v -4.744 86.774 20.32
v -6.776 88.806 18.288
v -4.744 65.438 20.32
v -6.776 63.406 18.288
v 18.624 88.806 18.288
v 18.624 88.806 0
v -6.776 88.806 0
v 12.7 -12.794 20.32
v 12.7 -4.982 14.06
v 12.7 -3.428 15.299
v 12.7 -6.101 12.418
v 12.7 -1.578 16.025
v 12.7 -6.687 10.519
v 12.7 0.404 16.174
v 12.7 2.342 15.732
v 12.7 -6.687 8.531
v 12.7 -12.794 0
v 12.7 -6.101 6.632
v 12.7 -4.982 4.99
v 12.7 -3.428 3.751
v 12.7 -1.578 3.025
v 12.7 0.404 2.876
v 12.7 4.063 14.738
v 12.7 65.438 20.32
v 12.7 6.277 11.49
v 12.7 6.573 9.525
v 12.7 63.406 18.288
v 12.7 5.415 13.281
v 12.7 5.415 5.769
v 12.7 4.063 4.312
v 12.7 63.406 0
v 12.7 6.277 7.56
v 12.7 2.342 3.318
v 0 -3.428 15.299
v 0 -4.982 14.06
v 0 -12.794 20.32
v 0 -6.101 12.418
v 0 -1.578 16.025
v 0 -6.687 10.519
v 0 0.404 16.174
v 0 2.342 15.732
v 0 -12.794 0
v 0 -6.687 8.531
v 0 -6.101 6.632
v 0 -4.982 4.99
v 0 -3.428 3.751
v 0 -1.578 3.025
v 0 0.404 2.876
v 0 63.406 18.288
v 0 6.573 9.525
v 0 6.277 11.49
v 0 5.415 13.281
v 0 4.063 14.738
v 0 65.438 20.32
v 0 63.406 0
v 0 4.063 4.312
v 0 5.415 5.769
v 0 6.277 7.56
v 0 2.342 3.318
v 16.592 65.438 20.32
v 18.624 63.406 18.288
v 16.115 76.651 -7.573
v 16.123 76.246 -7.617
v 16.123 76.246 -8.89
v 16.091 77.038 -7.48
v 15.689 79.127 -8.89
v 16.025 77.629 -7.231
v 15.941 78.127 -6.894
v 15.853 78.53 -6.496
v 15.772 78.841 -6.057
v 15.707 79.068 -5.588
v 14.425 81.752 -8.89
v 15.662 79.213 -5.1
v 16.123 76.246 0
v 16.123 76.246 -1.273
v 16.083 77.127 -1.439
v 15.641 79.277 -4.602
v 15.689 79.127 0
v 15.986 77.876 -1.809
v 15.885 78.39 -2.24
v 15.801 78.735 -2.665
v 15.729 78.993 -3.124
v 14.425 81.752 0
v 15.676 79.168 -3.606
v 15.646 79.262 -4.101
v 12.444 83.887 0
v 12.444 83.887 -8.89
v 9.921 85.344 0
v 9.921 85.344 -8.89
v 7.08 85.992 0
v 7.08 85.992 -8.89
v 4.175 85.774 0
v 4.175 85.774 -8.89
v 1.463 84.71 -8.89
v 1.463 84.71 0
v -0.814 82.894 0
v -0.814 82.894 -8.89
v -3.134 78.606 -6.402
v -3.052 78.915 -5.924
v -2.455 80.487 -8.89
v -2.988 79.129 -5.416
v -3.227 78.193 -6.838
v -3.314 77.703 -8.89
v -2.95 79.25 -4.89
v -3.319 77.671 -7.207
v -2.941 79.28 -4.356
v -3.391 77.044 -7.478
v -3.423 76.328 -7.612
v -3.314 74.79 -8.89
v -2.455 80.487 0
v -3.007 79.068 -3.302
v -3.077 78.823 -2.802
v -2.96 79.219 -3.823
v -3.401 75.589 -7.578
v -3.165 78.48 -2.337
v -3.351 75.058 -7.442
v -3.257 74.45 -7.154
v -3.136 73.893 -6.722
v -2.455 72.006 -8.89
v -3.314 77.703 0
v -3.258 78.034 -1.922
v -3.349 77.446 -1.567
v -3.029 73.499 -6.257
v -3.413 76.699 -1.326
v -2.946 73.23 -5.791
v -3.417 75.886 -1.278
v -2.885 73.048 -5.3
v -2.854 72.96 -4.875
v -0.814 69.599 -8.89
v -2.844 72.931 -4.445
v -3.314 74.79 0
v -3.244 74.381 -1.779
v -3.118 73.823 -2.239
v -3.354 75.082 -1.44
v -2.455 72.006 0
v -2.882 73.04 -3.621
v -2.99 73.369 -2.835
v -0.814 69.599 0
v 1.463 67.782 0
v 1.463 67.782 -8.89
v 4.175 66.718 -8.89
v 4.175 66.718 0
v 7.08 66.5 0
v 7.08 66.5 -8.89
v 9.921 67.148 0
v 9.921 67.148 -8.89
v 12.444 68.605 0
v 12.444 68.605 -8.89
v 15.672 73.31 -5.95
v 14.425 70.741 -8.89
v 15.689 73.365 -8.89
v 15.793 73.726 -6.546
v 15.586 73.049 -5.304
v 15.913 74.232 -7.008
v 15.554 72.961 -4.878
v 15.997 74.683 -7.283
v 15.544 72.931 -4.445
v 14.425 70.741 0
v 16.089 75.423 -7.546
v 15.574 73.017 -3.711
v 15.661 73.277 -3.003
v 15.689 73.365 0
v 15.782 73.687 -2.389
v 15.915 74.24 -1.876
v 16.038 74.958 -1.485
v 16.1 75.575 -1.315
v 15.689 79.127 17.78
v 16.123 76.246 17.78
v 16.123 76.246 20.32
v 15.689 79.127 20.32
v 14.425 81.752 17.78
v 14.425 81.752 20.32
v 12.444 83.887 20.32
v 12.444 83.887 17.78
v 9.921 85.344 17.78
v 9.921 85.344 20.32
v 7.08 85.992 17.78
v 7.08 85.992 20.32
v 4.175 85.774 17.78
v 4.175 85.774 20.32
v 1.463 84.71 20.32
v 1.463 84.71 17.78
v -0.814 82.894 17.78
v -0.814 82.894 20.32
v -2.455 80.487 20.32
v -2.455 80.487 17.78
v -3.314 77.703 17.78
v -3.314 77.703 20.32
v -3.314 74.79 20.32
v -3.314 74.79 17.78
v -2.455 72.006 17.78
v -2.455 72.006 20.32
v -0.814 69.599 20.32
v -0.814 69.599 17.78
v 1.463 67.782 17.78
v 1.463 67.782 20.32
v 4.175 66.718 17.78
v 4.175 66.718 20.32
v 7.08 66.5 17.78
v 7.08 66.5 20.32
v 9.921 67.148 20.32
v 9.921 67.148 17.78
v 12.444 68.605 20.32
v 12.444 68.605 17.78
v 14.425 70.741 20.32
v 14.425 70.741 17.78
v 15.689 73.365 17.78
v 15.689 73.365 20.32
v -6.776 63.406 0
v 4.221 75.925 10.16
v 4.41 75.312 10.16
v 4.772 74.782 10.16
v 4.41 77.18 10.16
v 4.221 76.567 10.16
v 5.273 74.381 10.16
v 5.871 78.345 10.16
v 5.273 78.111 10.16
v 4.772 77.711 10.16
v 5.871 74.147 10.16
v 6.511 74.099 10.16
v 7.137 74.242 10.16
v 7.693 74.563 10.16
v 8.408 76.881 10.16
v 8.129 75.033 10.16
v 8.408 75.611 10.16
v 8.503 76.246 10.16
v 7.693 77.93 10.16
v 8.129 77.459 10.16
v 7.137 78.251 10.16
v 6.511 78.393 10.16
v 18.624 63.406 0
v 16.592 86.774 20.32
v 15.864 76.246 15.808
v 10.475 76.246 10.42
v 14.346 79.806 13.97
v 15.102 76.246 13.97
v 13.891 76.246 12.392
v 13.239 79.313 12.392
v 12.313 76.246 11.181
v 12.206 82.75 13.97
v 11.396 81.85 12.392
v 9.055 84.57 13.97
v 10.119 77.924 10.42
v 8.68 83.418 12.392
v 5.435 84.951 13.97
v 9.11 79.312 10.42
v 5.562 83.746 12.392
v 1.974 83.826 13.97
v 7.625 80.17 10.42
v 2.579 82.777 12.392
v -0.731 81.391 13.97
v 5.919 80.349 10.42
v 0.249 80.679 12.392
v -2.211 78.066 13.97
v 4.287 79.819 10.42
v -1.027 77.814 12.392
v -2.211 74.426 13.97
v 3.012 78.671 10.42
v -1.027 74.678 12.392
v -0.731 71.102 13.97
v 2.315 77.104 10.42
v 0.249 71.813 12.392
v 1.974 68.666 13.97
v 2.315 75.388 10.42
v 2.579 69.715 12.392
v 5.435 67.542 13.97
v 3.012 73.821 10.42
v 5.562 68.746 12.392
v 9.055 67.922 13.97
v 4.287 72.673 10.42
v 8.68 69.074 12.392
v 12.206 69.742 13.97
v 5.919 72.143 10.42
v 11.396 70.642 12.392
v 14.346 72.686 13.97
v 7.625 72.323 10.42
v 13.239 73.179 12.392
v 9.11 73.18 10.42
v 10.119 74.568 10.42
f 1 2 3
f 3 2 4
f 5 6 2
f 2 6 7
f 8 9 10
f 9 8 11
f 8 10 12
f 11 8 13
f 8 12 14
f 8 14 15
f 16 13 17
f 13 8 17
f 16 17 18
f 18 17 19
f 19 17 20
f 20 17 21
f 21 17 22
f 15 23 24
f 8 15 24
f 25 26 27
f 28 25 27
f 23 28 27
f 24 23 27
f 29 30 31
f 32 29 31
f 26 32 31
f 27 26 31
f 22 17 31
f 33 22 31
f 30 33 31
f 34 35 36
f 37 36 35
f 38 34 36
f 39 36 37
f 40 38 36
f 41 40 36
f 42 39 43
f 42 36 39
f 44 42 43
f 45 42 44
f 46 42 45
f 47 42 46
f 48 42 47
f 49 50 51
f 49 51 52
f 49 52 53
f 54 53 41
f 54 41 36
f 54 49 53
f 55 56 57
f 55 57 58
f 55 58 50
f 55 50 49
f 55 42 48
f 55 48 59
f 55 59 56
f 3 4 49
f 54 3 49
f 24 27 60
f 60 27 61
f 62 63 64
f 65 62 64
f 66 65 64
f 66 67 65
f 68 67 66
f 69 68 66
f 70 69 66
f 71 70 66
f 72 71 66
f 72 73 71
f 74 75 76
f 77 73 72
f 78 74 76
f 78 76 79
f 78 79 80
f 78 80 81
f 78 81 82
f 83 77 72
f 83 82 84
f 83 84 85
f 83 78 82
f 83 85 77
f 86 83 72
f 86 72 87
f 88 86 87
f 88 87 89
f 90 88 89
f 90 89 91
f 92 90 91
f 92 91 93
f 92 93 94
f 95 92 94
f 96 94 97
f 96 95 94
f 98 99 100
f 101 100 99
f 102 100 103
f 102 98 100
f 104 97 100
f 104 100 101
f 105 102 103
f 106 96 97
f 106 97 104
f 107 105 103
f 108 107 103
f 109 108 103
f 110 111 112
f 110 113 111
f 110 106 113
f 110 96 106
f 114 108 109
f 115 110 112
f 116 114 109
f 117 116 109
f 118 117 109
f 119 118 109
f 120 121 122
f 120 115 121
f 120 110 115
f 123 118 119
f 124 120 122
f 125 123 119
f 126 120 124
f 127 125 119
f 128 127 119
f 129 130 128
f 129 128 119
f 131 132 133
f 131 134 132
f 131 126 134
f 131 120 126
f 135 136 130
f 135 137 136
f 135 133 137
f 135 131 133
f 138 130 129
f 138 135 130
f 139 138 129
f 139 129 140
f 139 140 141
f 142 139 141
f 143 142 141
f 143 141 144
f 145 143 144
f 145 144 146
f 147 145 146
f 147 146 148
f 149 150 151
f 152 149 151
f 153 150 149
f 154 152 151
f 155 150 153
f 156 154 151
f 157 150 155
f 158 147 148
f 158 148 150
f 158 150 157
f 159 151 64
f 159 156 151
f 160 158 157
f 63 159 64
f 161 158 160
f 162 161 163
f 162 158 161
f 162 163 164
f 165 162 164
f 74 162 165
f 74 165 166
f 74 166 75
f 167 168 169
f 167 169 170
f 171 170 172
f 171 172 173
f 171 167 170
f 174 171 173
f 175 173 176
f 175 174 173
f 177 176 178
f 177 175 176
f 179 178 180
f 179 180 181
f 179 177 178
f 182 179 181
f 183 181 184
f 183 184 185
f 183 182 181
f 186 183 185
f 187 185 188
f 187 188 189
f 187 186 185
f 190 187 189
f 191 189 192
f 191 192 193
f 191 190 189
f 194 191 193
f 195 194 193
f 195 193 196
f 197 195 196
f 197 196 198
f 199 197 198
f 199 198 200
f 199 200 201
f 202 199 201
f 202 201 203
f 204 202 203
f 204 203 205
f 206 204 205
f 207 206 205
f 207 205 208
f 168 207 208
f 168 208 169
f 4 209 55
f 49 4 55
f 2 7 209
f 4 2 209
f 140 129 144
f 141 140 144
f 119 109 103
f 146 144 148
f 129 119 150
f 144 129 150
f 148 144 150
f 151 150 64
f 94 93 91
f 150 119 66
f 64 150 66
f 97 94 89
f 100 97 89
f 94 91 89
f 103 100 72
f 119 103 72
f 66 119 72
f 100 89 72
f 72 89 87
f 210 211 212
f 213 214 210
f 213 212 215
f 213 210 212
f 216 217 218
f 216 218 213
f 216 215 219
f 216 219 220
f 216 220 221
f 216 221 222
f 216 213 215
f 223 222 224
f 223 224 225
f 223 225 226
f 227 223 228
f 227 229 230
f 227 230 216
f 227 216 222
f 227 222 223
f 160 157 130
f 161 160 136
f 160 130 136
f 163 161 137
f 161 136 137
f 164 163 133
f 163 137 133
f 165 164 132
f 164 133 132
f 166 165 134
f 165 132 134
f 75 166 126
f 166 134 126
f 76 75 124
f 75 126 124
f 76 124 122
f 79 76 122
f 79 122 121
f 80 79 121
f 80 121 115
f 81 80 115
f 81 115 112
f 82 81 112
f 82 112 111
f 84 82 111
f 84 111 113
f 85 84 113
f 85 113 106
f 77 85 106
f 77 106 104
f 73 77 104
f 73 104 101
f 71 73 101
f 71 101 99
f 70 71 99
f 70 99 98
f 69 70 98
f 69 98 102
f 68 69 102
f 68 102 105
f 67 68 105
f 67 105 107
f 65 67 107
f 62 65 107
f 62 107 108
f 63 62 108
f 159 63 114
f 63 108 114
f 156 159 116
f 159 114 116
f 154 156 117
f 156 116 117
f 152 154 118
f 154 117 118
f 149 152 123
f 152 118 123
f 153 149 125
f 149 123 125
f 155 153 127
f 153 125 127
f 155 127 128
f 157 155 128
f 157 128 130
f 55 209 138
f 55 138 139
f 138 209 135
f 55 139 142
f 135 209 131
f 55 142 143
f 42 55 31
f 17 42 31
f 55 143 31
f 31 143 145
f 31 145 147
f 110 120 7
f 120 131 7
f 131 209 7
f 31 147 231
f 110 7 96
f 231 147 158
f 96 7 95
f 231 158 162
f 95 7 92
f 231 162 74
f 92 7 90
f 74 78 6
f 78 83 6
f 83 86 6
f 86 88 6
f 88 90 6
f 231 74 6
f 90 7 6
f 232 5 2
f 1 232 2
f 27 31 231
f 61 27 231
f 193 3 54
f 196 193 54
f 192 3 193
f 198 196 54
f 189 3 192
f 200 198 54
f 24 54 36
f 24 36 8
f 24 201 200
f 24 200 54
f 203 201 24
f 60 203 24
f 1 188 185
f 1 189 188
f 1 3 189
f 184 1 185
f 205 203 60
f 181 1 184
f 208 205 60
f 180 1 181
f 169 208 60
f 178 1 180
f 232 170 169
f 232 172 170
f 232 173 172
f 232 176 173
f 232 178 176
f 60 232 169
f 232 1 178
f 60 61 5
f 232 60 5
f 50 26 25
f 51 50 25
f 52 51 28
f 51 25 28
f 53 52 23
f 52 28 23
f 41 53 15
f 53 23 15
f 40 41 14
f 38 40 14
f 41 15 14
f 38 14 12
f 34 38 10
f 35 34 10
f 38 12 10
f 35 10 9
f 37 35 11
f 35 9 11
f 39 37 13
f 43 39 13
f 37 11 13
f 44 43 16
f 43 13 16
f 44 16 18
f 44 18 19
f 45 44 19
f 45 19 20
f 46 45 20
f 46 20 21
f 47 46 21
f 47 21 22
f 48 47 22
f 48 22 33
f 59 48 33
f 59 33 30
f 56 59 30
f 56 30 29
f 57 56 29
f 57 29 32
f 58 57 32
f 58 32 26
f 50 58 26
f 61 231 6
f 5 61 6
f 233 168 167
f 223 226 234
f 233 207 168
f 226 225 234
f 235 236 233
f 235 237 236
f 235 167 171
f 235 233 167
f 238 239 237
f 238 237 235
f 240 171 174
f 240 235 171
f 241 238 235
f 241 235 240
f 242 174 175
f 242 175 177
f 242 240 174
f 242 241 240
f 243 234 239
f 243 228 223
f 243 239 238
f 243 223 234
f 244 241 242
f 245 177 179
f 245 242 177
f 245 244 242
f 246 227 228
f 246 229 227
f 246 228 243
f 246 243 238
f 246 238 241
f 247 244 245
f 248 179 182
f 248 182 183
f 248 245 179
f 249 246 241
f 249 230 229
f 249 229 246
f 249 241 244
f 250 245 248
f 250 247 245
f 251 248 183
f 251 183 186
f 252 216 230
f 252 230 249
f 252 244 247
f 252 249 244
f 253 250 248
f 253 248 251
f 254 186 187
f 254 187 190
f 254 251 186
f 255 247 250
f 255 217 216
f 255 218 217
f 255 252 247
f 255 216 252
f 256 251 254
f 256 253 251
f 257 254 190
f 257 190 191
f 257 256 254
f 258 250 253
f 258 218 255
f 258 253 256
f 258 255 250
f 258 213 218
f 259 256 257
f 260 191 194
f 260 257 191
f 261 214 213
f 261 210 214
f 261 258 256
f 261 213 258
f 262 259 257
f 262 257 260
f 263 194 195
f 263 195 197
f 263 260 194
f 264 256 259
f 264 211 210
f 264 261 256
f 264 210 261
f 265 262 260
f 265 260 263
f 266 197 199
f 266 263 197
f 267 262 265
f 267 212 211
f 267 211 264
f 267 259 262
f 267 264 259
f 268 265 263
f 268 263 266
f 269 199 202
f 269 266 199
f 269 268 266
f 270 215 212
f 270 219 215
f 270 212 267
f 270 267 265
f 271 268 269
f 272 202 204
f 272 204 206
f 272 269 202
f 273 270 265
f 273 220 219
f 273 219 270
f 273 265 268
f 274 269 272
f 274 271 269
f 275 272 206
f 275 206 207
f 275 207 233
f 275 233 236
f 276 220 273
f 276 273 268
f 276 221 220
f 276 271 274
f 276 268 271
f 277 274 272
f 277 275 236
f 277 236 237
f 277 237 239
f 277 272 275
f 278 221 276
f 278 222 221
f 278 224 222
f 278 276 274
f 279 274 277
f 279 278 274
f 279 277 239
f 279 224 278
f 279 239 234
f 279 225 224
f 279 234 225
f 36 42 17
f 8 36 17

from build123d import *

# Parameters (mm, degrees)
F0_R     = 9.7732259702
F0_W     = 12.7
F0_H     = 76.2
F1_DEPTH = 20.32
F2_DEPTH = 10.16
F3_R     = 7.62
F5_D     = 13.335
F6_SIZE  = 2.032
F7_DEPTH = 8.89
F9_D     = 6.35


with BuildPart() as f1:
    # F0 (on Top) → F1 (new body)
    with BuildSketch(Plane.XY):
        Polygon((-6.7755430937, 63.4059129299), (0, 63.4059129299), (12.7, 63.4059129299), (18.6244569063, 63.4059129299), (18.6244569063, 88.8059129299), (-6.7755430937, 88.8059129299), align=None)
        with Locations((6.35, 76.2461349368)):
            Circle(F0_R, mode=Mode.SUBTRACT)
        with Locations((6.35, 25.3059129299)):
            Rectangle(F0_W, F0_H)
    extrude(amount=F1_DEPTH)

    # F0 (on Top) → F2 (join)
    with BuildSketch(Plane.XY):
        with Locations((6.35, 76.2461349368)):
            Circle(F0_R)
    extrude(amount=F2_DEPTH)

    # F3
    f3_edges = [f1.edges().sort_by_distance(p)[0] for p in [
        (-3.423226, 76.246135, 10.16),
    ]]
    fillet(f3_edges, radius=F3_R)

    # F5 (through all)
    with Locations(Plane(origin=(0, 0, 0), x_dir=(0, -1, 0), z_dir=(-1, 0, 0))):
        with Locations((0.0940870701, 9.525)):
            Hole(F5_D / 2)

    # F6
    f6_edges = [f1.edges().sort_by_distance(p)[0] for p in [
        (-6.775543, 76.105913, 20.32),
        (18.624457, 76.105913, 20.32),
        (-3.387772, 63.405913, 20.32),
        (15.662228, 63.405913, 20.32),
        (5.924457, 88.805913, 20.32),
    ]]
    chamfer(f6_edges, length=F6_SIZE)

    # F0 (on Top) → F7 (join)
    with BuildSketch(Plane.XY):
        with Locations((6.35, 76.2461349368)):
            Circle(F0_R)
    extrude(amount=-F7_DEPTH)

    # F9 (through all)
    with Locations(Plane.YZ.offset(18.6244569063)):
        with Locations((76.1059129299, -4.445)):
            Hole(F9_D / 2)


solid = f1.part
